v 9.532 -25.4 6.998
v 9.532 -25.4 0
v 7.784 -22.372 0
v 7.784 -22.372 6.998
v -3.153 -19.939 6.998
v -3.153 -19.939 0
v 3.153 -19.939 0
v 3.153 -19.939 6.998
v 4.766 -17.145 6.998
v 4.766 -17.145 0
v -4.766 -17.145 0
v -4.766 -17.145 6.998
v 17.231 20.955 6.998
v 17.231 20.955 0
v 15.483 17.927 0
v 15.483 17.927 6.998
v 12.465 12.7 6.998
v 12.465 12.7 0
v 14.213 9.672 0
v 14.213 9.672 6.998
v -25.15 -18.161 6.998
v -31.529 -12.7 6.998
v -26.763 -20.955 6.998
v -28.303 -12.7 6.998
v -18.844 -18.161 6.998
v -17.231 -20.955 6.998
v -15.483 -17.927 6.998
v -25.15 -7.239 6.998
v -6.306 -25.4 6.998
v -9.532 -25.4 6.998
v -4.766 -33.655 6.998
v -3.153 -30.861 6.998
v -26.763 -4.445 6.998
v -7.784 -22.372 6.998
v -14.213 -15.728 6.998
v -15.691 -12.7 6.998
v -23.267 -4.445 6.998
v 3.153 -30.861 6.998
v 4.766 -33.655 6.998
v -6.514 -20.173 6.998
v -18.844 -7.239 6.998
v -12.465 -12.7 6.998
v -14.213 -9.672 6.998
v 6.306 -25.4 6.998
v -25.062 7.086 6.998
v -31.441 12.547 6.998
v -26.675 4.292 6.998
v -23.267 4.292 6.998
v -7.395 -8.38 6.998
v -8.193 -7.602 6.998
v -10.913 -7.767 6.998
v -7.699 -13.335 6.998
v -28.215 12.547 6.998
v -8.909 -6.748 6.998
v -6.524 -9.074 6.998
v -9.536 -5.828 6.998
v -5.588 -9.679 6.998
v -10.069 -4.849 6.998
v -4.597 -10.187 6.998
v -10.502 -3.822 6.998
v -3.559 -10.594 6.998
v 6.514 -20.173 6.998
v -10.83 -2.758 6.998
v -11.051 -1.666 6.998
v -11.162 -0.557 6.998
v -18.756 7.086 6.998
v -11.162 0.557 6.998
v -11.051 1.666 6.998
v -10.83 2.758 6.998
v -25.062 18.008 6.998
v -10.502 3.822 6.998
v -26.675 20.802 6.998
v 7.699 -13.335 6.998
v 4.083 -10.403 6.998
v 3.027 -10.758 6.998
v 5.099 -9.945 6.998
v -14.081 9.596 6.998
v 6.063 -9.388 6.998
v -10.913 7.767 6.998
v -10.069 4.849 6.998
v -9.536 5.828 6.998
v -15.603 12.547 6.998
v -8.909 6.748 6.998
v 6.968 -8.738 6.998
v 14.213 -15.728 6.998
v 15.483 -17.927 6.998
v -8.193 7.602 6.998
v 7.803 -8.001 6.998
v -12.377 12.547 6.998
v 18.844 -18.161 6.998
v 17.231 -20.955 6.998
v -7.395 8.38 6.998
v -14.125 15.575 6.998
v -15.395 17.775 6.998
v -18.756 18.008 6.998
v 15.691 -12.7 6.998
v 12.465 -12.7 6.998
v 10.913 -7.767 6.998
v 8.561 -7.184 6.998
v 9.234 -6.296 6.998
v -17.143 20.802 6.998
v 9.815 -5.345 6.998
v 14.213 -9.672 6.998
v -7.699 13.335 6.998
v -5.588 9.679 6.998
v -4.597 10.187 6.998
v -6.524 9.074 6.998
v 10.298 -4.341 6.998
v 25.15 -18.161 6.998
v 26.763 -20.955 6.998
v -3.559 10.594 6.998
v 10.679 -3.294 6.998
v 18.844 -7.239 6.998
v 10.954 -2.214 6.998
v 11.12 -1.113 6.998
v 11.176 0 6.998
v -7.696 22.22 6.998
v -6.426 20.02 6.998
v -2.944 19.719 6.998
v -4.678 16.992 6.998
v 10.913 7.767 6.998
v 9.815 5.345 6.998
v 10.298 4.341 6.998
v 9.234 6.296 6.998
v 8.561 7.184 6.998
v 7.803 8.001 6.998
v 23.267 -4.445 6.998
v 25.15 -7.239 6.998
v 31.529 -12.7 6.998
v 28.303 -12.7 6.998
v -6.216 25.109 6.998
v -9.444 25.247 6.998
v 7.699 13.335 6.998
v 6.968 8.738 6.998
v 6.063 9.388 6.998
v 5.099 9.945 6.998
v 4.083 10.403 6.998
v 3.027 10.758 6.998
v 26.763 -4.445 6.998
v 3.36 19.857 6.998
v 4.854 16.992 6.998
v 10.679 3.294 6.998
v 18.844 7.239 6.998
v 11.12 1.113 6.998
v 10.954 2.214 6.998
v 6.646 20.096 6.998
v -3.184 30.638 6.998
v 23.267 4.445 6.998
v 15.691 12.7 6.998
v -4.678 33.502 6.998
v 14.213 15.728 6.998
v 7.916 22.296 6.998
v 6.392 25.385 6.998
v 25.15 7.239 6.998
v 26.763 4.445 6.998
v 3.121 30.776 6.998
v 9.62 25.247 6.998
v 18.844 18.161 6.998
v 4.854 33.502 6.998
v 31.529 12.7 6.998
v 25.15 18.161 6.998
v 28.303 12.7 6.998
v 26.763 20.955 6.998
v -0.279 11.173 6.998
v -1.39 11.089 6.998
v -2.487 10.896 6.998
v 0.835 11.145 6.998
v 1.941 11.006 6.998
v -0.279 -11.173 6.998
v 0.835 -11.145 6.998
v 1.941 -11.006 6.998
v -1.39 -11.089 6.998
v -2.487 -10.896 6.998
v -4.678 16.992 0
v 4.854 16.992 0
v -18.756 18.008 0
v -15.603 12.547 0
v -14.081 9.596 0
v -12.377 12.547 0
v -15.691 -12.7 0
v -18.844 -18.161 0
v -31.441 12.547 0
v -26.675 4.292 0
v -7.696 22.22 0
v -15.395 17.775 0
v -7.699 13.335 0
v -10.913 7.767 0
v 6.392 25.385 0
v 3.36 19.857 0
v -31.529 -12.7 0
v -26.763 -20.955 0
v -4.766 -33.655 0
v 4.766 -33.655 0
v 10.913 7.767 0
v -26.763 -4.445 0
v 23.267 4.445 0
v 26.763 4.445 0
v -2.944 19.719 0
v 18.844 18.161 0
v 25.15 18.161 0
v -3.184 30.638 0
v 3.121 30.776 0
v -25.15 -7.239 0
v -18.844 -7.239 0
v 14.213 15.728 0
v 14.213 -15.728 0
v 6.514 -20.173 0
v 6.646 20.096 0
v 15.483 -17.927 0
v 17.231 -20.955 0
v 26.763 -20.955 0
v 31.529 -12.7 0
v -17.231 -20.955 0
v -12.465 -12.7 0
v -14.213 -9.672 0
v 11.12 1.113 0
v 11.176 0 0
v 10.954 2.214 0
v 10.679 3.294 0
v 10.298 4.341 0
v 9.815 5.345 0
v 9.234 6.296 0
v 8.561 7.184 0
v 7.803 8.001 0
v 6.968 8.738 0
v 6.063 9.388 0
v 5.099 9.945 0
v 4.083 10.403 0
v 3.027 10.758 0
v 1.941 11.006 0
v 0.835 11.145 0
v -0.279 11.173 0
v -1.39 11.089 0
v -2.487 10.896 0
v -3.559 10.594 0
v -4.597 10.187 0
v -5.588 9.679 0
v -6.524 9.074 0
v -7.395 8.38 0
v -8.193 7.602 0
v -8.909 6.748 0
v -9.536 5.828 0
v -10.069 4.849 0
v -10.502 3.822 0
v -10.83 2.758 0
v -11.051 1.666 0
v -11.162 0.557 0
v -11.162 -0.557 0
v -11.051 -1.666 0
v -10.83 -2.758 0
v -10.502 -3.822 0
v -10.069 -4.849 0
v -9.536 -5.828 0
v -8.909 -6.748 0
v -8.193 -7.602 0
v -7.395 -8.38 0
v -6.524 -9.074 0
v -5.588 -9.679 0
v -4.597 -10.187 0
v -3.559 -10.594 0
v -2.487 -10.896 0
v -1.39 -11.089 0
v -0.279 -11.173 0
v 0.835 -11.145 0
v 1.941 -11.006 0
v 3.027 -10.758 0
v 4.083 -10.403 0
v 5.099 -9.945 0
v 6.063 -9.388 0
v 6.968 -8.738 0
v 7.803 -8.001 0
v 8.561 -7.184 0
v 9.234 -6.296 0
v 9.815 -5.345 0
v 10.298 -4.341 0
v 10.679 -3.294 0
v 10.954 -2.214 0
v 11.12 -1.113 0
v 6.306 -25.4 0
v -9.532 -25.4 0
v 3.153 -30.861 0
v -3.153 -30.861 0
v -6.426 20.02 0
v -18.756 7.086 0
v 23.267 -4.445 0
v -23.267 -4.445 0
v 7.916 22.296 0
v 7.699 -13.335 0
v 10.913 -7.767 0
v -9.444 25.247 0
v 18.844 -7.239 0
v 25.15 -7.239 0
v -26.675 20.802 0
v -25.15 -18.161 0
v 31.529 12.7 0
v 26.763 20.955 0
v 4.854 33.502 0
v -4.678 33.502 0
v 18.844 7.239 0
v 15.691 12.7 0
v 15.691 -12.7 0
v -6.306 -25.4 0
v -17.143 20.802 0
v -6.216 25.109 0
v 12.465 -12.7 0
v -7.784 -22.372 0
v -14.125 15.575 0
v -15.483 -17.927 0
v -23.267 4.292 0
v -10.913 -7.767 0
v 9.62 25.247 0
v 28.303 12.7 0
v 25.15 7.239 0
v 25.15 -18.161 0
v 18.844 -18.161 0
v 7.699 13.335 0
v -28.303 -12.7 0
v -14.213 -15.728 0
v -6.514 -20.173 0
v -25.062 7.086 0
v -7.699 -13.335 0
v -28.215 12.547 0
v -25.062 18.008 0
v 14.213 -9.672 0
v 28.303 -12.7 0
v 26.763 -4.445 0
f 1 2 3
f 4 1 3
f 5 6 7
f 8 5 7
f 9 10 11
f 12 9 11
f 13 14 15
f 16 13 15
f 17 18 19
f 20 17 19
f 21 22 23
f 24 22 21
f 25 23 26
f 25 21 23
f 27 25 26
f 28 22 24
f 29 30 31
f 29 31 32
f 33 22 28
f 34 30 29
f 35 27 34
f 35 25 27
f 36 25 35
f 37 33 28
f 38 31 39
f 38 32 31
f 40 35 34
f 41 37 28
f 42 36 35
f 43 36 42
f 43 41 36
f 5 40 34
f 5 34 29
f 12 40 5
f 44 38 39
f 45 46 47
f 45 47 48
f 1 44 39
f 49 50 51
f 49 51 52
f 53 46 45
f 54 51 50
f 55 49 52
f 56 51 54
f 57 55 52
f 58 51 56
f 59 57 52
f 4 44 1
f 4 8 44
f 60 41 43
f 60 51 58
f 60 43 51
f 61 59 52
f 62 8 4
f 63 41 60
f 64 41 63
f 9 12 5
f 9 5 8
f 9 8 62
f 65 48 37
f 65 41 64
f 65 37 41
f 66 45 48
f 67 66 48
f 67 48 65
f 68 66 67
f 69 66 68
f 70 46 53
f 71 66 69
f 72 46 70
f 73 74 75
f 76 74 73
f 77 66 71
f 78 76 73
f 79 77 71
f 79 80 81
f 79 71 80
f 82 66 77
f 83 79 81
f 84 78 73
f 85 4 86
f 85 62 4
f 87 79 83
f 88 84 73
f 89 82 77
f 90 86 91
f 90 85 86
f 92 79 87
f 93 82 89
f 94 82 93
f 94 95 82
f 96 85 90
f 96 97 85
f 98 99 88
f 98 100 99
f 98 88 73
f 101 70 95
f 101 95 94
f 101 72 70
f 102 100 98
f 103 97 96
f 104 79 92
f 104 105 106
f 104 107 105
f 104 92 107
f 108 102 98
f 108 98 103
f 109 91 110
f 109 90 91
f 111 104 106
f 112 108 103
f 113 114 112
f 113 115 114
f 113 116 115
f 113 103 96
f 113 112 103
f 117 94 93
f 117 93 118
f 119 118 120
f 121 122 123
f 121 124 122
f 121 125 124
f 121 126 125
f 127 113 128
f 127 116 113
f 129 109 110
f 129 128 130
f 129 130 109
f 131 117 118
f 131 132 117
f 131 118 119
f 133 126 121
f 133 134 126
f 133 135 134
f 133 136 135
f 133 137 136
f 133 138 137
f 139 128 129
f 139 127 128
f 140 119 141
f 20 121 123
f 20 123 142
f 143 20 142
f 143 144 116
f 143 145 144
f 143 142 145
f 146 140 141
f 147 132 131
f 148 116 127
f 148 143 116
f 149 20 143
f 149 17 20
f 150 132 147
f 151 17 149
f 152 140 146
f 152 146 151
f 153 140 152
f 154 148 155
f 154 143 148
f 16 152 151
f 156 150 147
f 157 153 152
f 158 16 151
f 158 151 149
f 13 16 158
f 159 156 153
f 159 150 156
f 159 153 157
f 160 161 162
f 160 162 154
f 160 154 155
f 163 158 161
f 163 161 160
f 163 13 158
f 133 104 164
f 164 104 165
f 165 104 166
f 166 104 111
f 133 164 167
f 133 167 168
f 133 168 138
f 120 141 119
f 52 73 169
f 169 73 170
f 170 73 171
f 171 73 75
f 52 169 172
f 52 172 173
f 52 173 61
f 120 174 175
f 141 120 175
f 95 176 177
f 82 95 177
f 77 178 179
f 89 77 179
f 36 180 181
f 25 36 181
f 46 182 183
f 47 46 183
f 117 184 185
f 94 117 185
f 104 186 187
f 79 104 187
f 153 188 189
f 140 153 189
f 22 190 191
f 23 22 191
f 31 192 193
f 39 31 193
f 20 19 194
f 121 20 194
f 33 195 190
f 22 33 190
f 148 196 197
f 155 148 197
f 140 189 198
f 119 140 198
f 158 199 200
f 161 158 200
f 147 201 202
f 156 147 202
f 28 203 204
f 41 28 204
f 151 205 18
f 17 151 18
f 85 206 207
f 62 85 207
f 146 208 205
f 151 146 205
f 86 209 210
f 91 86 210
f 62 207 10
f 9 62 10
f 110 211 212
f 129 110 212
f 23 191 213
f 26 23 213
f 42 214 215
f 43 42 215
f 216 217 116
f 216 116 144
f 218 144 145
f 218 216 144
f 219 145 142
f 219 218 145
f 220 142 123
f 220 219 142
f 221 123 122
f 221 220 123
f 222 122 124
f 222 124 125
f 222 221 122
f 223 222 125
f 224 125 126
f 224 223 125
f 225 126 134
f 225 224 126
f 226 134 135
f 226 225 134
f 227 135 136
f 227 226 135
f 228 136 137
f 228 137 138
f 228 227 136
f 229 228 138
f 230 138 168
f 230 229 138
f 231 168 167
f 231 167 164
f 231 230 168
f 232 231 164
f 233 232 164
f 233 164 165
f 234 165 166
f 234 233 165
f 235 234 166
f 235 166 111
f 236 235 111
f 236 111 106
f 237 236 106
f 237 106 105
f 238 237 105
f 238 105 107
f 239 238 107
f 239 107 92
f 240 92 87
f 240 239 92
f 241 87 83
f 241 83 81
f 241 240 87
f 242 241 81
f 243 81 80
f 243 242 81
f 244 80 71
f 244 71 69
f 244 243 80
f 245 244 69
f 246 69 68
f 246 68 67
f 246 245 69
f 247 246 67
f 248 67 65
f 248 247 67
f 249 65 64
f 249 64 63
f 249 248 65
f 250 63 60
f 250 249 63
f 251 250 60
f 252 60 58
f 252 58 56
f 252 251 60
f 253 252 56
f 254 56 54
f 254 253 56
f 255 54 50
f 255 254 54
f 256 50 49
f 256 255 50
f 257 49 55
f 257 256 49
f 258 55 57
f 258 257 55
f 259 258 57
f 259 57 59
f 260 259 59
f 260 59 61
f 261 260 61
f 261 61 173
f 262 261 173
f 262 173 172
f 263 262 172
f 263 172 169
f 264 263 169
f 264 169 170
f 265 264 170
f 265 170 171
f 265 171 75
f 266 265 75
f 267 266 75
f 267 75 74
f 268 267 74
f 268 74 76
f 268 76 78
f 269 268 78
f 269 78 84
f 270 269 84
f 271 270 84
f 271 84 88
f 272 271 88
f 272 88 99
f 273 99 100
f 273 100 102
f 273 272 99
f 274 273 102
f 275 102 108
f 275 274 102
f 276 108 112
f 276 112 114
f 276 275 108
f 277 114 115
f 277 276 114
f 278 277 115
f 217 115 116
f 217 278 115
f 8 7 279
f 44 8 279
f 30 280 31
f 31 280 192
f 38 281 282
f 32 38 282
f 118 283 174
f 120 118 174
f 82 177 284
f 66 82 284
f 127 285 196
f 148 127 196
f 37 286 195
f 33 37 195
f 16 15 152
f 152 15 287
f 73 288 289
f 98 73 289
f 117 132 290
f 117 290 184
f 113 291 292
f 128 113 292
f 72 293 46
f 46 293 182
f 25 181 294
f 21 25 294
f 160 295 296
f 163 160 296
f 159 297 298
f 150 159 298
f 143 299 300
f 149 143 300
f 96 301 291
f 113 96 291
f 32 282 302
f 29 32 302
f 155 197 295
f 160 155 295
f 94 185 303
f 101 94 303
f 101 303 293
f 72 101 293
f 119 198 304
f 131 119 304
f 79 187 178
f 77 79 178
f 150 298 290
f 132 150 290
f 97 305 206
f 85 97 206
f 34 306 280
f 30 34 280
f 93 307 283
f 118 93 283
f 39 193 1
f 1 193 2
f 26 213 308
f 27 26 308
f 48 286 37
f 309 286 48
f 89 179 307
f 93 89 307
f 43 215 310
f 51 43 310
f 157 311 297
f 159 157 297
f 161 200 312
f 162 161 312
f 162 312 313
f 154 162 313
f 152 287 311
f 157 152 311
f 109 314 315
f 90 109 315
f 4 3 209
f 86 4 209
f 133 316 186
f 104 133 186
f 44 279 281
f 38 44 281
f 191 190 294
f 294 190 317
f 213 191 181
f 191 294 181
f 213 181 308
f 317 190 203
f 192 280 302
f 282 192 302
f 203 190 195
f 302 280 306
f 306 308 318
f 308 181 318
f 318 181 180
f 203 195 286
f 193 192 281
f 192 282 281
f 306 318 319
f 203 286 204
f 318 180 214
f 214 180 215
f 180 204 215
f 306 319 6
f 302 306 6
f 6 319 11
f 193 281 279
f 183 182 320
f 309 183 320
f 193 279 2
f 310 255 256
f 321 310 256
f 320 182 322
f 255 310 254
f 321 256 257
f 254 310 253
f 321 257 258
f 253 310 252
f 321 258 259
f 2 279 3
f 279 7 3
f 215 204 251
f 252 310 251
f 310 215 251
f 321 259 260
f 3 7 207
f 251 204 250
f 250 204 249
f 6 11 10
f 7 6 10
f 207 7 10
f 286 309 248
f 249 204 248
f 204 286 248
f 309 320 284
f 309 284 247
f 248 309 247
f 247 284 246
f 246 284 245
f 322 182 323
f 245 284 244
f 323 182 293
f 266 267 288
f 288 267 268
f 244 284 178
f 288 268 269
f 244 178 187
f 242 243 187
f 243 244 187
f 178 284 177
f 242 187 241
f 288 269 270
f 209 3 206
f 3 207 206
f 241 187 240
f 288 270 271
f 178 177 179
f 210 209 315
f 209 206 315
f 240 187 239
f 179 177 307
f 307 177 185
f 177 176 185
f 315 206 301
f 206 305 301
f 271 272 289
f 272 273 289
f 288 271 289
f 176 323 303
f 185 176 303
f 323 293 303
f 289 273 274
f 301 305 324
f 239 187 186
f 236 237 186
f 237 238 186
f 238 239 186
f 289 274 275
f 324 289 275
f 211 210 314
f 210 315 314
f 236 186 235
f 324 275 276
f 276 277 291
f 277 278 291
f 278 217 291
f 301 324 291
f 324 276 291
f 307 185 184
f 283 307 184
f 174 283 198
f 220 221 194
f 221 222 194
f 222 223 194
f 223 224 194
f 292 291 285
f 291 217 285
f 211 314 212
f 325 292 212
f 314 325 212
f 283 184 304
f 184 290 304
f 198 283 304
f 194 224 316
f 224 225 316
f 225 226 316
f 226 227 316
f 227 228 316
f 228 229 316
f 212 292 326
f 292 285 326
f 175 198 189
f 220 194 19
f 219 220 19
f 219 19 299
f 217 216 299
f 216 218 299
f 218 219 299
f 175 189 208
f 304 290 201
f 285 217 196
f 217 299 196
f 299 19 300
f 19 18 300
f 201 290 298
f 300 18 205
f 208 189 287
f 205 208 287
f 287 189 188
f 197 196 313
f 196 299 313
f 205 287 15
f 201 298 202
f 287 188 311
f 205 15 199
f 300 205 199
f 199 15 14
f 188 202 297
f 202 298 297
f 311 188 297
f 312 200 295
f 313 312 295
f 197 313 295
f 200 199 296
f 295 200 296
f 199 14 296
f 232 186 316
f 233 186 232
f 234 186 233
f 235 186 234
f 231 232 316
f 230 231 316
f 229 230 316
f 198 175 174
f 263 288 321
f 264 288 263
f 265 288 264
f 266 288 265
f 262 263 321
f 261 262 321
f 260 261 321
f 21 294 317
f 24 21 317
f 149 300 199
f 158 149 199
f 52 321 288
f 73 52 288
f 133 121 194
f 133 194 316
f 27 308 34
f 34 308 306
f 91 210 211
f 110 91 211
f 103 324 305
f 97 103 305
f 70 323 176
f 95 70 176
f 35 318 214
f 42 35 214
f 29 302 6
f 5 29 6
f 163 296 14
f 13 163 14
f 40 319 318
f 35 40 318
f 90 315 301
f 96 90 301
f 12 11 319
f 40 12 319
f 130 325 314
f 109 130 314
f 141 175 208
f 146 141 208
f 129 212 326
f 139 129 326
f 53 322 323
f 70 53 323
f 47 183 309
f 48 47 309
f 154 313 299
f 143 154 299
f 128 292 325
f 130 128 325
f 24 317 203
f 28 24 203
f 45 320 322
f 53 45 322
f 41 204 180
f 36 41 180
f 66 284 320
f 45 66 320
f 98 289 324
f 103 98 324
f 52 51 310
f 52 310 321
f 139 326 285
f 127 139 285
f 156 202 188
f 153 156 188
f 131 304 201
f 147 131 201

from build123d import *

# Parameters (mm, degrees)
F0_W     = 2.54
F0_H     = 8.7372876405
F0_H_2   = 8.89
F1_DEPTH = 6.9977
F2_R     = 11.176
F3_DEPTH = 6.9977


with BuildPart() as f1:
    # F0 (on Top) → F1 (new body)
    with BuildSketch(Plane.XY):
        Polygon((-11.6335226281, 5.2501477372), (-10.3635226281, 7.4498522628), (-14.0807527651, 9.595996083), (-15.3507527651, 7.3962915574), align=None)
        Polygon((-14.6646968374, 0), (-11.6335226281, 5.2501477372), (-15.3507527651, 7.3962915574), (-17.1428502621, 4.2922876405), (-20.7270452561, 4.2922876405), (-20.7270452561, -4.445), (-17.231018784, -4.445), (-15.4830055479, -7.4726477372), (-11.6335226281, -5.2501477372), align=None)
        Polygon((-15.3507527651, 7.3962915574), (-14.0807527651, 9.595996083), (-12.3768237899, 12.5472876405), (-14.124837026, 15.5749353777), (-14.2130055479, 15.7276477372), (-15.394837026, 17.7746399033), (-17.1428502621, 20.8022876405), (-26.6749032064, 20.8022876405), (-31.4409296786, 12.5472876405), (-26.6749032064, 4.2922876405), (-23.2670452561, 4.2922876405), (-20.7270452561, 4.2922876405), (-17.1428502621, 4.2922876405), align=None)
        Polygon((-18.7559669142, 18.0082876405), (-15.6030570942, 12.5472876405), (-18.7559669142, 7.0862876405), (-25.0617865543, 7.0862876405), (-28.2146963743, 12.5472876405), (-25.0617865543, 18.0082876405), align=None, mode=Mode.SUBTRACT)
        Polygon((14.2130055479, 9.6723522628), (10.3635226281, 7.4498522628), (11.6335226281, 5.2501477372), (15.4830055479, 7.4726477372), align=None)
        Polygon((-10.3635226281, -7.4498522628), (-11.6335226281, -5.2501477372), (-15.4830055479, -7.4726477372), (-14.2130055479, -9.6723522628), align=None)
        Polygon((-14.2130055479, 15.7276477372), (-14.124837026, 15.5749353777), (-6.4258711864, 20.0199353777), (-7.6958711864, 22.2196399033), (-15.394837026, 17.7746399033), align=None)
        Polygon((15.4830055479, 7.4726477372), (11.6335226281, 5.2501477372), (14.6646968374, 0), (11.6335226281, -5.2501477372), (15.4830055479, -7.4726477372), (17.231018784, -4.445), (20.7270452561, -4.445), (20.7270452561, 4.445), (17.231018784, 4.445), align=None)
        Polygon((12.4649923118, 12.7), (14.2130055479, 9.6723522628), (15.4830055479, 7.4726477372), (17.231018784, 4.445), (20.7270452561, 4.445), (23.2670452561, 4.445), (26.7630717283, 4.445), (31.5290982004, 12.7), (26.7630717283, 20.955), (17.231018784, 20.955), (15.4830055479, 17.9273522628), (14.2130055479, 15.7276477372), align=None)
        Polygon((25.1499550762, 7.239), (18.8441354361, 7.239), (15.691225616, 12.7), (18.8441354361, 18.161), (25.1499550762, 18.161), (28.3028648962, 12.7), align=None, mode=Mode.SUBTRACT)
        Polygon((-14.2130055479, -9.6723522628), (-15.4830055479, -7.4726477372), (-17.231018784, -4.445), (-20.7270452561, -4.445), (-23.2670452561, -4.445), (-26.7630717283, -4.445), (-31.5290982004, -12.7), (-26.7630717283, -20.955), (-17.231018784, -20.955), (-15.4830055479, -17.9273522628), (-14.2130055479, -15.7276477372), (-12.4649923118, -12.7), align=None)
        Polygon((-25.1499550762, -7.239), (-18.8441354361, -7.239), (-15.691225616, -12.7), (-18.8441354361, -18.161), (-25.1499550762, -18.161), (-28.3028648962, -12.7), align=None, mode=Mode.SUBTRACT)
        with Locations((-21.9970452561, -0.0763561798)):
            Rectangle(F0_W, F0_H)
        Polygon((-7.6958711864, 22.2196399033), (-6.4258711864, 20.0199353777), (-4.6778579503, 16.9922876405), (-1.27, 16.9922876405), (1.27, 16.9922876405), (4.854194994, 16.9922876405), (6.6462924911, 20.0962915574), (7.9162924911, 22.295996083), (9.6202214662, 25.2472876405), (4.854194994, 33.5022876405), (-4.6778579503, 33.5022876405), (-9.4438844224, 25.2472876405), align=None)
        Polygon((6.3924737908, 25.3854774003), (3.3599969989, 19.8566940043), (-2.94430827, 19.7185042444), (-6.216136747, 25.1090978806), (-3.1836599552, 30.6378812766), (3.1206453137, 30.7760710365), align=None, mode=Mode.SUBTRACT)
        Polygon((15.4830055479, -7.4726477372), (11.6335226281, -5.2501477372), (10.3635226281, -7.4498522628), (14.2130055479, -9.6723522628), align=None)
        Polygon((6.6462924911, 20.0962915574), (14.2130055479, 15.7276477372), (15.4830055479, 17.9273522628), (7.9162924911, 22.295996083), align=None)
        Polygon((17.231018784, -4.445), (15.4830055479, -7.4726477372), (14.2130055479, -9.6723522628), (12.4649923118, -12.7), (14.2130055479, -15.7276477372), (15.4830055479, -17.9273522628), (17.231018784, -20.955), (26.7630717283, -20.955), (31.5290982004, -12.7), (26.7630717283, -4.445), (23.2670452561, -4.445), (20.7270452561, -4.445), align=None)
        Polygon((18.8441354361, -18.161), (15.691225616, -12.7), (18.8441354361, -7.239), (25.1499550762, -7.239), (28.3028648962, -12.7), (25.1499550762, -18.161), align=None, mode=Mode.SUBTRACT)
        with Locations((21.9970452561, 0)):
            Rectangle(F0_W, F0_H_2)
        Polygon((-6.5140397082, -20.1726477372), (-14.2130055479, -15.7276477372), (-15.4830055479, -17.9273522628), (-7.7840397082, -22.3723522628), align=None)
        Polygon((-4.7660264722, -17.145), (-6.5140397082, -20.1726477372), (-7.7840397082, -22.3723522628), (-9.5320529443, -25.4), (-4.7660264722, -33.655), (4.7660264722, -33.655), (9.5320529443, -25.4), (7.7840397082, -22.3723522628), (6.5140397082, -20.1726477372), (4.7660264722, -17.145), (1.27, -17.145), (-1.27, -17.145), align=None)
        Polygon((-6.3058196401, -25.4), (-3.15290982, -19.939), (3.15290982, -19.939), (6.3058196401, -25.4), (3.15290982, -30.861), (-3.15290982, -30.861), align=None, mode=Mode.SUBTRACT)
        Polygon((15.4830055479, -17.9273522628), (14.2130055479, -15.7276477372), (6.5140397082, -20.1726477372), (7.7840397082, -22.3723522628), align=None)
    extrude(amount=F1_DEPTH)

    # F2 (on Top) → F3 (join)
    with BuildSketch(Plane.XY):
        Polygon((7.6989658396, 13.335), (-7.6989658396, 13.335), (-15.3979316793, 0), (-7.6989658396, -13.335), (7.6989658396, -13.335), (15.3979316793, 0), align=None)
        Circle(F2_R, mode=Mode.SUBTRACT)
    extrude(amount=F3_DEPTH)


solid = f1.part
